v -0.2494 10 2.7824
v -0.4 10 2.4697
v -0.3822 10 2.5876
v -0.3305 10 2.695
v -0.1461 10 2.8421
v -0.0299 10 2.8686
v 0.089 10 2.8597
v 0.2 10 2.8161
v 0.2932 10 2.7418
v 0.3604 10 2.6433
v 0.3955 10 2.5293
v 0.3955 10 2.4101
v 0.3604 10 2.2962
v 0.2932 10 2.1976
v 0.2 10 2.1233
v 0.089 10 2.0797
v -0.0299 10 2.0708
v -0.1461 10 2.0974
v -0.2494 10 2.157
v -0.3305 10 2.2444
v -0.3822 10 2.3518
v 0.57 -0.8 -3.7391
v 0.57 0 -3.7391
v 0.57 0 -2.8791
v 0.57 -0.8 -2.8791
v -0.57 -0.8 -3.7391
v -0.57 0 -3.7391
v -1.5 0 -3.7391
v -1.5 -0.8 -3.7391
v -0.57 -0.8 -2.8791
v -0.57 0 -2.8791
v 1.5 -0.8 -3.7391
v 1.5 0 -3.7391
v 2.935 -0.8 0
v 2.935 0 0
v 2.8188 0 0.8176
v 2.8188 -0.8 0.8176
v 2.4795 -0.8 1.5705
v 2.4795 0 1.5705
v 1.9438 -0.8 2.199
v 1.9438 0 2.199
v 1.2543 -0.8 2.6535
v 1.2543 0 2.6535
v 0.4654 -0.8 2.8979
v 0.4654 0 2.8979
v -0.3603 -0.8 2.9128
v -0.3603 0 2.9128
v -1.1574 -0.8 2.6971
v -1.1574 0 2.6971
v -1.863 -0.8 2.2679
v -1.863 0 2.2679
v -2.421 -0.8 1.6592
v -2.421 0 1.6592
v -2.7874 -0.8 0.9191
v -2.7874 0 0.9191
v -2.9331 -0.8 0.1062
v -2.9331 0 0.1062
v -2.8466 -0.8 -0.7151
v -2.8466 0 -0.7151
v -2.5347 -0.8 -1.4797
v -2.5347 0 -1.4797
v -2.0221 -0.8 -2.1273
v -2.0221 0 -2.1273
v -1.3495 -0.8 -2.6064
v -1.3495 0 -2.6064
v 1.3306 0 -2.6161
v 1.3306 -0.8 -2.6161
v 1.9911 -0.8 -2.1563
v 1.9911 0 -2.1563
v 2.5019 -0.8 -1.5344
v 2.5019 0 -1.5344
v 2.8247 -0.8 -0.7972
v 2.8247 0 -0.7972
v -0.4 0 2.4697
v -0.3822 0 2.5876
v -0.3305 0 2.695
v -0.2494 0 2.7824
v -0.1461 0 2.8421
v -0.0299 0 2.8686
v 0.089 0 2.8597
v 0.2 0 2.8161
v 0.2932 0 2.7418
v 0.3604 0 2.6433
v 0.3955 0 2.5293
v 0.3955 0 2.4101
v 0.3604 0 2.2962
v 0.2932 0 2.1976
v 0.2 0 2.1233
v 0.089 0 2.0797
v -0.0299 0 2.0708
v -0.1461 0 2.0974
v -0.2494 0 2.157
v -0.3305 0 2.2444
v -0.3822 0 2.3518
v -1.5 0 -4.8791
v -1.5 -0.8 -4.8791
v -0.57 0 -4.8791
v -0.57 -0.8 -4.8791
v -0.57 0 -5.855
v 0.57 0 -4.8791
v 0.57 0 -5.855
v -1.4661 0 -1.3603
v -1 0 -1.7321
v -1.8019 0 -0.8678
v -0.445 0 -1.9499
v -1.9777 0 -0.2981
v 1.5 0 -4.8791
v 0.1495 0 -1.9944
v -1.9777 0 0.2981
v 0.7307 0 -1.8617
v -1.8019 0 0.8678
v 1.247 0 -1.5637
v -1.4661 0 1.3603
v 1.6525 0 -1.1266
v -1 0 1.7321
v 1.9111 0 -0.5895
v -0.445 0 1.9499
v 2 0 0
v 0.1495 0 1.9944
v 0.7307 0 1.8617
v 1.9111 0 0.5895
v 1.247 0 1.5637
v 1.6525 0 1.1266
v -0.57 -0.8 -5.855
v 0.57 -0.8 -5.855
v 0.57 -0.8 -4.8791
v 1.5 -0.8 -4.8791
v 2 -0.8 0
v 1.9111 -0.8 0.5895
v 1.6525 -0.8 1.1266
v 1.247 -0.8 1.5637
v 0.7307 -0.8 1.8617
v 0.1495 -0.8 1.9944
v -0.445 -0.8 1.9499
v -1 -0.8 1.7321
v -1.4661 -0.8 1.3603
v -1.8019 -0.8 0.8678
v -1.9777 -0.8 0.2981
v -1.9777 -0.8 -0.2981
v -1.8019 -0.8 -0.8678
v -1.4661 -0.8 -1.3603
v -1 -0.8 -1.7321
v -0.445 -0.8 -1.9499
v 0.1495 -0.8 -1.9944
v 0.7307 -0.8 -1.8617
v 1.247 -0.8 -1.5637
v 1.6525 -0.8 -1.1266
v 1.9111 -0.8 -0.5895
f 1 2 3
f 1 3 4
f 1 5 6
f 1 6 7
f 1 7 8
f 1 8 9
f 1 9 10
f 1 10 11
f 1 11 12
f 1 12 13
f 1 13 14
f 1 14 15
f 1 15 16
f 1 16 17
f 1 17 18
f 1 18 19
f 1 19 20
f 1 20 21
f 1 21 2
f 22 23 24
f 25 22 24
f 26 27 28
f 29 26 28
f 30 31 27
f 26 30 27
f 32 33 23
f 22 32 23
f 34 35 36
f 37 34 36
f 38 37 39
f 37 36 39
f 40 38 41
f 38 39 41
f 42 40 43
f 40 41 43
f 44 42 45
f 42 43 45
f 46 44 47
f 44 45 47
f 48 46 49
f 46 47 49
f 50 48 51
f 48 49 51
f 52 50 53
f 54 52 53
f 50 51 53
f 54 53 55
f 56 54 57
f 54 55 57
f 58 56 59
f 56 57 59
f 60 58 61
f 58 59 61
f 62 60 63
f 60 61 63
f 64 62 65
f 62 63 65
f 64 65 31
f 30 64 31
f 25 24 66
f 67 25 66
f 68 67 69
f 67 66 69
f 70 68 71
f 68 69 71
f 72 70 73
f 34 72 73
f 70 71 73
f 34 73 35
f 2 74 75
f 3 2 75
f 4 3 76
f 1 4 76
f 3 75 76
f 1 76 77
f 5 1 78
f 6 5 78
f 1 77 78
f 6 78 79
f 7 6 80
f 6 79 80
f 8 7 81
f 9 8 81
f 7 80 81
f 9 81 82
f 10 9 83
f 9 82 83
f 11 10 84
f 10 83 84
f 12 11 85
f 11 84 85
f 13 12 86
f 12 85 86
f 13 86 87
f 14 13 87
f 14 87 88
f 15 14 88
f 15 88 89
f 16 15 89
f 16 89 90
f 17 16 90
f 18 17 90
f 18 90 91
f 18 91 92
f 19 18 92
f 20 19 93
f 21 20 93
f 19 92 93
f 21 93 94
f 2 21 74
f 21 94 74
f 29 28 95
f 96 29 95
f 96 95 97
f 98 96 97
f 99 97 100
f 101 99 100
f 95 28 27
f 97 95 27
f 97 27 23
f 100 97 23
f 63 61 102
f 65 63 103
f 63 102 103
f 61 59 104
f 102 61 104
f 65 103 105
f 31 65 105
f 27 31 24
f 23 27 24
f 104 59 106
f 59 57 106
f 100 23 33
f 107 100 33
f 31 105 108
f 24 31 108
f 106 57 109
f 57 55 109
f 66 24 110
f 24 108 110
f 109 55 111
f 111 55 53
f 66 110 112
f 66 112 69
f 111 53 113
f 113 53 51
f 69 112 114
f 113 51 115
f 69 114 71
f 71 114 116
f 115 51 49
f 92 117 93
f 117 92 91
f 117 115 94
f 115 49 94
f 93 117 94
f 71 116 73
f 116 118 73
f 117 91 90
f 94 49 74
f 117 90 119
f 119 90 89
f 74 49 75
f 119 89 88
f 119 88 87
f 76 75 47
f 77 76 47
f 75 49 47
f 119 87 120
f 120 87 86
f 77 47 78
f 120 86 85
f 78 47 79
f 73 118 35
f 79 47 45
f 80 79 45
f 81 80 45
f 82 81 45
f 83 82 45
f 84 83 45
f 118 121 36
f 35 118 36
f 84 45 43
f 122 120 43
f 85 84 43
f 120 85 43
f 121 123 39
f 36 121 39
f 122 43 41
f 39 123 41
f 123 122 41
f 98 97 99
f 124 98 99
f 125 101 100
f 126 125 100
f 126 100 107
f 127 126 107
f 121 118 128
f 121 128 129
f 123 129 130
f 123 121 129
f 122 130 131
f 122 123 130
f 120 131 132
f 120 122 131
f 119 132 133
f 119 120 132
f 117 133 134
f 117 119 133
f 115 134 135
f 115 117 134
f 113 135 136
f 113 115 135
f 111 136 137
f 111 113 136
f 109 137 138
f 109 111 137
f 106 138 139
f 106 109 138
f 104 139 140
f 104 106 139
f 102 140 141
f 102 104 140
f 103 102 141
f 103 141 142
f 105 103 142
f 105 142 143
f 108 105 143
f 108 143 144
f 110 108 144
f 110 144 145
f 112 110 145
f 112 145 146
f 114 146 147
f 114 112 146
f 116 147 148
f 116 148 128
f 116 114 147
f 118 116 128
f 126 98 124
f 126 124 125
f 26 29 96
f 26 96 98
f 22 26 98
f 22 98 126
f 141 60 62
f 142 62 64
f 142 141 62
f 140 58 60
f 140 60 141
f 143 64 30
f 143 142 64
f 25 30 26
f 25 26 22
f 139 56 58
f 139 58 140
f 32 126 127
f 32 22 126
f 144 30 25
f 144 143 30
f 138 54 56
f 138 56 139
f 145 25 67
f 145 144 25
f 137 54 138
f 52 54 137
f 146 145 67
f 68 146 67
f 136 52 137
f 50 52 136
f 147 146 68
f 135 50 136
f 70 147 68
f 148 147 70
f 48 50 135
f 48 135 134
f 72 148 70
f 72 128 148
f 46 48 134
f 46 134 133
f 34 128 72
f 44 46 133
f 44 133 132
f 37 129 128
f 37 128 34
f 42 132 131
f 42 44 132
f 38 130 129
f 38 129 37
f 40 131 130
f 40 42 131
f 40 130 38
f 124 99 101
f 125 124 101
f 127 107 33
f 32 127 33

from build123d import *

# Parameters (mm, degrees)
F0_R     = 2
F1_DEPTH = 0.8
F2_R     = 0.4
F3_DEPTH = 10


with BuildPart() as f1:
    # F0 (on Front) → F1 (new body)
    with BuildSketch(Plane.XZ):
        with BuildLine():
            ThreePointArc((0.57, -2.879119), (2.267948, -1.862965), (2.935, 0))
            ThreePointArc((2.935, 0), (-1.862965, 2.267948), (-0.57, -2.879119))
            ThreePointArc((-0.57, -2.879119), (-0.286366, -2.920996), (0, -2.935))
            ThreePointArc((0, -2.935), (0.286366, -2.920996), (0.57, -2.879119))
        make_face()
        Circle(F0_R, mode=Mode.SUBTRACT)
        Polygon((1.5, -3.739119), (0.57, -3.739119), (0, -3.739119), (0, -5.855), (0.57, -5.855), (0.57, -4.879119), (1.5, -4.879119), align=None)
        with BuildLine():
            Line((0.57, -3.739119), (0.57, -2.879119))
            ThreePointArc((0.57, -2.879119), (0.286366, -2.920996), (0, -2.935))
            Line((0, -2.935), (0, -3.739119))
            Line((0, -3.739119), (0.57, -3.739119))
        make_face()
        with BuildLine():
            ThreePointArc((0, -2.935), (-0.286366, -2.920996), (-0.57, -2.879119))
            Line((-0.57, -2.879119), (-0.57, -3.739119))
            Line((-0.57, -3.739119), (0, -3.739119))
            Line((0, -3.739119), (0, -2.935))
        make_face()
        Polygon((0, -3.739119), (-0.57, -3.739119), (-1.5, -3.739119), (-1.5, -4.879119), (-0.57, -4.879119), (-0.57, -5.855), (0, -5.855), align=None)
    extrude(amount=F1_DEPTH)

    # F2 (on face) → F3 (join)
    with BuildSketch(Plane(origin=(0, 0, 0), x_dir=(-1, 0, 0), z_dir=(0, 1, 0))):
        with Locations((0, 2.469715)):
            Circle(F2_R)
    extrude(amount=F3_DEPTH)


solid = f1.part
